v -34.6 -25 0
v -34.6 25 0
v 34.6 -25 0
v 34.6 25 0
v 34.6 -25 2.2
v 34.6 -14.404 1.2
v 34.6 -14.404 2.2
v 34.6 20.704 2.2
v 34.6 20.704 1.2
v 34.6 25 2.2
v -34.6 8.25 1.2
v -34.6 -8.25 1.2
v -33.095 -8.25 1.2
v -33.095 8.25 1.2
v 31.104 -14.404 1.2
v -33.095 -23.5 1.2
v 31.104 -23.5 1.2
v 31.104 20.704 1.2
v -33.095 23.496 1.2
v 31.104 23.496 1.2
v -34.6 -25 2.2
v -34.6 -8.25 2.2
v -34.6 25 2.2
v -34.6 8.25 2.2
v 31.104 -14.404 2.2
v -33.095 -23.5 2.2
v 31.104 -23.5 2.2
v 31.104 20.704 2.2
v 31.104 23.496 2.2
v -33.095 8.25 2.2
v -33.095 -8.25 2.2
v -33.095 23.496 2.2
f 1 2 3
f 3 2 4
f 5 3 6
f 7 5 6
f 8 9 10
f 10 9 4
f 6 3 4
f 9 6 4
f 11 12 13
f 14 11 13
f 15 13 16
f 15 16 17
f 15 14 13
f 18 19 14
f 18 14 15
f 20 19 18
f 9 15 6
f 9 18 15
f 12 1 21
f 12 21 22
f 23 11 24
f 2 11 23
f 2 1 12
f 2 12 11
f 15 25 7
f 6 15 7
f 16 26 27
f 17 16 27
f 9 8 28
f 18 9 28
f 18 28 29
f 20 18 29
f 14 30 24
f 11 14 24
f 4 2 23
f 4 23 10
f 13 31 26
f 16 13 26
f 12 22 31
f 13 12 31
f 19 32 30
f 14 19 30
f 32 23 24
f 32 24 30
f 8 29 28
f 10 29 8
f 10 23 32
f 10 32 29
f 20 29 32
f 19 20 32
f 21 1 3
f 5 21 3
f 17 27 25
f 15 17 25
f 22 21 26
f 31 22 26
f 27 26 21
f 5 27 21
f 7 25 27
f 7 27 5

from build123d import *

# Parameters (mm, degrees)
ESQUISSE1_W             = 69.2
ESQUISSE1_H             = 50
BOSS_EXTRU_1_DEPTH      = 2.2
ENL_V_MAT_EXTRU_1_DEPTH = 1


with BuildPart() as part:
    # Esquisse1 → Boss.-Extru.1 (new body)
    with BuildSketch(Plane.XY):
        Rectangle(ESQUISSE1_W, ESQUISSE1_H)
    extrude(amount=BOSS_EXTRU_1_DEPTH)

    # Esquisse2 → Enlèv. mat.-Extru.1 (cut)
    with BuildSketch(Plane.XY.offset(2.2)):
        Polygon((34.6, 20.704314338), (31.104320123, 20.704314338), (31.104320123, 23.495586326), (-33.095389285, 23.495586326), (-33.095389285, 8.25), (-34.510836618, 8.25), (-34.6, 8.25), (-34.6, -8.25), (-33.095389285, -8.25), (-33.095389285, -23.5), (31.104320123, -23.5), (31.104320123, -14.404258976), (34.6, -14.404258976), align=None)
    extrude(amount=-ENL_V_MAT_EXTRU_1_DEPTH, mode=Mode.SUBTRACT)


solid = part.part
